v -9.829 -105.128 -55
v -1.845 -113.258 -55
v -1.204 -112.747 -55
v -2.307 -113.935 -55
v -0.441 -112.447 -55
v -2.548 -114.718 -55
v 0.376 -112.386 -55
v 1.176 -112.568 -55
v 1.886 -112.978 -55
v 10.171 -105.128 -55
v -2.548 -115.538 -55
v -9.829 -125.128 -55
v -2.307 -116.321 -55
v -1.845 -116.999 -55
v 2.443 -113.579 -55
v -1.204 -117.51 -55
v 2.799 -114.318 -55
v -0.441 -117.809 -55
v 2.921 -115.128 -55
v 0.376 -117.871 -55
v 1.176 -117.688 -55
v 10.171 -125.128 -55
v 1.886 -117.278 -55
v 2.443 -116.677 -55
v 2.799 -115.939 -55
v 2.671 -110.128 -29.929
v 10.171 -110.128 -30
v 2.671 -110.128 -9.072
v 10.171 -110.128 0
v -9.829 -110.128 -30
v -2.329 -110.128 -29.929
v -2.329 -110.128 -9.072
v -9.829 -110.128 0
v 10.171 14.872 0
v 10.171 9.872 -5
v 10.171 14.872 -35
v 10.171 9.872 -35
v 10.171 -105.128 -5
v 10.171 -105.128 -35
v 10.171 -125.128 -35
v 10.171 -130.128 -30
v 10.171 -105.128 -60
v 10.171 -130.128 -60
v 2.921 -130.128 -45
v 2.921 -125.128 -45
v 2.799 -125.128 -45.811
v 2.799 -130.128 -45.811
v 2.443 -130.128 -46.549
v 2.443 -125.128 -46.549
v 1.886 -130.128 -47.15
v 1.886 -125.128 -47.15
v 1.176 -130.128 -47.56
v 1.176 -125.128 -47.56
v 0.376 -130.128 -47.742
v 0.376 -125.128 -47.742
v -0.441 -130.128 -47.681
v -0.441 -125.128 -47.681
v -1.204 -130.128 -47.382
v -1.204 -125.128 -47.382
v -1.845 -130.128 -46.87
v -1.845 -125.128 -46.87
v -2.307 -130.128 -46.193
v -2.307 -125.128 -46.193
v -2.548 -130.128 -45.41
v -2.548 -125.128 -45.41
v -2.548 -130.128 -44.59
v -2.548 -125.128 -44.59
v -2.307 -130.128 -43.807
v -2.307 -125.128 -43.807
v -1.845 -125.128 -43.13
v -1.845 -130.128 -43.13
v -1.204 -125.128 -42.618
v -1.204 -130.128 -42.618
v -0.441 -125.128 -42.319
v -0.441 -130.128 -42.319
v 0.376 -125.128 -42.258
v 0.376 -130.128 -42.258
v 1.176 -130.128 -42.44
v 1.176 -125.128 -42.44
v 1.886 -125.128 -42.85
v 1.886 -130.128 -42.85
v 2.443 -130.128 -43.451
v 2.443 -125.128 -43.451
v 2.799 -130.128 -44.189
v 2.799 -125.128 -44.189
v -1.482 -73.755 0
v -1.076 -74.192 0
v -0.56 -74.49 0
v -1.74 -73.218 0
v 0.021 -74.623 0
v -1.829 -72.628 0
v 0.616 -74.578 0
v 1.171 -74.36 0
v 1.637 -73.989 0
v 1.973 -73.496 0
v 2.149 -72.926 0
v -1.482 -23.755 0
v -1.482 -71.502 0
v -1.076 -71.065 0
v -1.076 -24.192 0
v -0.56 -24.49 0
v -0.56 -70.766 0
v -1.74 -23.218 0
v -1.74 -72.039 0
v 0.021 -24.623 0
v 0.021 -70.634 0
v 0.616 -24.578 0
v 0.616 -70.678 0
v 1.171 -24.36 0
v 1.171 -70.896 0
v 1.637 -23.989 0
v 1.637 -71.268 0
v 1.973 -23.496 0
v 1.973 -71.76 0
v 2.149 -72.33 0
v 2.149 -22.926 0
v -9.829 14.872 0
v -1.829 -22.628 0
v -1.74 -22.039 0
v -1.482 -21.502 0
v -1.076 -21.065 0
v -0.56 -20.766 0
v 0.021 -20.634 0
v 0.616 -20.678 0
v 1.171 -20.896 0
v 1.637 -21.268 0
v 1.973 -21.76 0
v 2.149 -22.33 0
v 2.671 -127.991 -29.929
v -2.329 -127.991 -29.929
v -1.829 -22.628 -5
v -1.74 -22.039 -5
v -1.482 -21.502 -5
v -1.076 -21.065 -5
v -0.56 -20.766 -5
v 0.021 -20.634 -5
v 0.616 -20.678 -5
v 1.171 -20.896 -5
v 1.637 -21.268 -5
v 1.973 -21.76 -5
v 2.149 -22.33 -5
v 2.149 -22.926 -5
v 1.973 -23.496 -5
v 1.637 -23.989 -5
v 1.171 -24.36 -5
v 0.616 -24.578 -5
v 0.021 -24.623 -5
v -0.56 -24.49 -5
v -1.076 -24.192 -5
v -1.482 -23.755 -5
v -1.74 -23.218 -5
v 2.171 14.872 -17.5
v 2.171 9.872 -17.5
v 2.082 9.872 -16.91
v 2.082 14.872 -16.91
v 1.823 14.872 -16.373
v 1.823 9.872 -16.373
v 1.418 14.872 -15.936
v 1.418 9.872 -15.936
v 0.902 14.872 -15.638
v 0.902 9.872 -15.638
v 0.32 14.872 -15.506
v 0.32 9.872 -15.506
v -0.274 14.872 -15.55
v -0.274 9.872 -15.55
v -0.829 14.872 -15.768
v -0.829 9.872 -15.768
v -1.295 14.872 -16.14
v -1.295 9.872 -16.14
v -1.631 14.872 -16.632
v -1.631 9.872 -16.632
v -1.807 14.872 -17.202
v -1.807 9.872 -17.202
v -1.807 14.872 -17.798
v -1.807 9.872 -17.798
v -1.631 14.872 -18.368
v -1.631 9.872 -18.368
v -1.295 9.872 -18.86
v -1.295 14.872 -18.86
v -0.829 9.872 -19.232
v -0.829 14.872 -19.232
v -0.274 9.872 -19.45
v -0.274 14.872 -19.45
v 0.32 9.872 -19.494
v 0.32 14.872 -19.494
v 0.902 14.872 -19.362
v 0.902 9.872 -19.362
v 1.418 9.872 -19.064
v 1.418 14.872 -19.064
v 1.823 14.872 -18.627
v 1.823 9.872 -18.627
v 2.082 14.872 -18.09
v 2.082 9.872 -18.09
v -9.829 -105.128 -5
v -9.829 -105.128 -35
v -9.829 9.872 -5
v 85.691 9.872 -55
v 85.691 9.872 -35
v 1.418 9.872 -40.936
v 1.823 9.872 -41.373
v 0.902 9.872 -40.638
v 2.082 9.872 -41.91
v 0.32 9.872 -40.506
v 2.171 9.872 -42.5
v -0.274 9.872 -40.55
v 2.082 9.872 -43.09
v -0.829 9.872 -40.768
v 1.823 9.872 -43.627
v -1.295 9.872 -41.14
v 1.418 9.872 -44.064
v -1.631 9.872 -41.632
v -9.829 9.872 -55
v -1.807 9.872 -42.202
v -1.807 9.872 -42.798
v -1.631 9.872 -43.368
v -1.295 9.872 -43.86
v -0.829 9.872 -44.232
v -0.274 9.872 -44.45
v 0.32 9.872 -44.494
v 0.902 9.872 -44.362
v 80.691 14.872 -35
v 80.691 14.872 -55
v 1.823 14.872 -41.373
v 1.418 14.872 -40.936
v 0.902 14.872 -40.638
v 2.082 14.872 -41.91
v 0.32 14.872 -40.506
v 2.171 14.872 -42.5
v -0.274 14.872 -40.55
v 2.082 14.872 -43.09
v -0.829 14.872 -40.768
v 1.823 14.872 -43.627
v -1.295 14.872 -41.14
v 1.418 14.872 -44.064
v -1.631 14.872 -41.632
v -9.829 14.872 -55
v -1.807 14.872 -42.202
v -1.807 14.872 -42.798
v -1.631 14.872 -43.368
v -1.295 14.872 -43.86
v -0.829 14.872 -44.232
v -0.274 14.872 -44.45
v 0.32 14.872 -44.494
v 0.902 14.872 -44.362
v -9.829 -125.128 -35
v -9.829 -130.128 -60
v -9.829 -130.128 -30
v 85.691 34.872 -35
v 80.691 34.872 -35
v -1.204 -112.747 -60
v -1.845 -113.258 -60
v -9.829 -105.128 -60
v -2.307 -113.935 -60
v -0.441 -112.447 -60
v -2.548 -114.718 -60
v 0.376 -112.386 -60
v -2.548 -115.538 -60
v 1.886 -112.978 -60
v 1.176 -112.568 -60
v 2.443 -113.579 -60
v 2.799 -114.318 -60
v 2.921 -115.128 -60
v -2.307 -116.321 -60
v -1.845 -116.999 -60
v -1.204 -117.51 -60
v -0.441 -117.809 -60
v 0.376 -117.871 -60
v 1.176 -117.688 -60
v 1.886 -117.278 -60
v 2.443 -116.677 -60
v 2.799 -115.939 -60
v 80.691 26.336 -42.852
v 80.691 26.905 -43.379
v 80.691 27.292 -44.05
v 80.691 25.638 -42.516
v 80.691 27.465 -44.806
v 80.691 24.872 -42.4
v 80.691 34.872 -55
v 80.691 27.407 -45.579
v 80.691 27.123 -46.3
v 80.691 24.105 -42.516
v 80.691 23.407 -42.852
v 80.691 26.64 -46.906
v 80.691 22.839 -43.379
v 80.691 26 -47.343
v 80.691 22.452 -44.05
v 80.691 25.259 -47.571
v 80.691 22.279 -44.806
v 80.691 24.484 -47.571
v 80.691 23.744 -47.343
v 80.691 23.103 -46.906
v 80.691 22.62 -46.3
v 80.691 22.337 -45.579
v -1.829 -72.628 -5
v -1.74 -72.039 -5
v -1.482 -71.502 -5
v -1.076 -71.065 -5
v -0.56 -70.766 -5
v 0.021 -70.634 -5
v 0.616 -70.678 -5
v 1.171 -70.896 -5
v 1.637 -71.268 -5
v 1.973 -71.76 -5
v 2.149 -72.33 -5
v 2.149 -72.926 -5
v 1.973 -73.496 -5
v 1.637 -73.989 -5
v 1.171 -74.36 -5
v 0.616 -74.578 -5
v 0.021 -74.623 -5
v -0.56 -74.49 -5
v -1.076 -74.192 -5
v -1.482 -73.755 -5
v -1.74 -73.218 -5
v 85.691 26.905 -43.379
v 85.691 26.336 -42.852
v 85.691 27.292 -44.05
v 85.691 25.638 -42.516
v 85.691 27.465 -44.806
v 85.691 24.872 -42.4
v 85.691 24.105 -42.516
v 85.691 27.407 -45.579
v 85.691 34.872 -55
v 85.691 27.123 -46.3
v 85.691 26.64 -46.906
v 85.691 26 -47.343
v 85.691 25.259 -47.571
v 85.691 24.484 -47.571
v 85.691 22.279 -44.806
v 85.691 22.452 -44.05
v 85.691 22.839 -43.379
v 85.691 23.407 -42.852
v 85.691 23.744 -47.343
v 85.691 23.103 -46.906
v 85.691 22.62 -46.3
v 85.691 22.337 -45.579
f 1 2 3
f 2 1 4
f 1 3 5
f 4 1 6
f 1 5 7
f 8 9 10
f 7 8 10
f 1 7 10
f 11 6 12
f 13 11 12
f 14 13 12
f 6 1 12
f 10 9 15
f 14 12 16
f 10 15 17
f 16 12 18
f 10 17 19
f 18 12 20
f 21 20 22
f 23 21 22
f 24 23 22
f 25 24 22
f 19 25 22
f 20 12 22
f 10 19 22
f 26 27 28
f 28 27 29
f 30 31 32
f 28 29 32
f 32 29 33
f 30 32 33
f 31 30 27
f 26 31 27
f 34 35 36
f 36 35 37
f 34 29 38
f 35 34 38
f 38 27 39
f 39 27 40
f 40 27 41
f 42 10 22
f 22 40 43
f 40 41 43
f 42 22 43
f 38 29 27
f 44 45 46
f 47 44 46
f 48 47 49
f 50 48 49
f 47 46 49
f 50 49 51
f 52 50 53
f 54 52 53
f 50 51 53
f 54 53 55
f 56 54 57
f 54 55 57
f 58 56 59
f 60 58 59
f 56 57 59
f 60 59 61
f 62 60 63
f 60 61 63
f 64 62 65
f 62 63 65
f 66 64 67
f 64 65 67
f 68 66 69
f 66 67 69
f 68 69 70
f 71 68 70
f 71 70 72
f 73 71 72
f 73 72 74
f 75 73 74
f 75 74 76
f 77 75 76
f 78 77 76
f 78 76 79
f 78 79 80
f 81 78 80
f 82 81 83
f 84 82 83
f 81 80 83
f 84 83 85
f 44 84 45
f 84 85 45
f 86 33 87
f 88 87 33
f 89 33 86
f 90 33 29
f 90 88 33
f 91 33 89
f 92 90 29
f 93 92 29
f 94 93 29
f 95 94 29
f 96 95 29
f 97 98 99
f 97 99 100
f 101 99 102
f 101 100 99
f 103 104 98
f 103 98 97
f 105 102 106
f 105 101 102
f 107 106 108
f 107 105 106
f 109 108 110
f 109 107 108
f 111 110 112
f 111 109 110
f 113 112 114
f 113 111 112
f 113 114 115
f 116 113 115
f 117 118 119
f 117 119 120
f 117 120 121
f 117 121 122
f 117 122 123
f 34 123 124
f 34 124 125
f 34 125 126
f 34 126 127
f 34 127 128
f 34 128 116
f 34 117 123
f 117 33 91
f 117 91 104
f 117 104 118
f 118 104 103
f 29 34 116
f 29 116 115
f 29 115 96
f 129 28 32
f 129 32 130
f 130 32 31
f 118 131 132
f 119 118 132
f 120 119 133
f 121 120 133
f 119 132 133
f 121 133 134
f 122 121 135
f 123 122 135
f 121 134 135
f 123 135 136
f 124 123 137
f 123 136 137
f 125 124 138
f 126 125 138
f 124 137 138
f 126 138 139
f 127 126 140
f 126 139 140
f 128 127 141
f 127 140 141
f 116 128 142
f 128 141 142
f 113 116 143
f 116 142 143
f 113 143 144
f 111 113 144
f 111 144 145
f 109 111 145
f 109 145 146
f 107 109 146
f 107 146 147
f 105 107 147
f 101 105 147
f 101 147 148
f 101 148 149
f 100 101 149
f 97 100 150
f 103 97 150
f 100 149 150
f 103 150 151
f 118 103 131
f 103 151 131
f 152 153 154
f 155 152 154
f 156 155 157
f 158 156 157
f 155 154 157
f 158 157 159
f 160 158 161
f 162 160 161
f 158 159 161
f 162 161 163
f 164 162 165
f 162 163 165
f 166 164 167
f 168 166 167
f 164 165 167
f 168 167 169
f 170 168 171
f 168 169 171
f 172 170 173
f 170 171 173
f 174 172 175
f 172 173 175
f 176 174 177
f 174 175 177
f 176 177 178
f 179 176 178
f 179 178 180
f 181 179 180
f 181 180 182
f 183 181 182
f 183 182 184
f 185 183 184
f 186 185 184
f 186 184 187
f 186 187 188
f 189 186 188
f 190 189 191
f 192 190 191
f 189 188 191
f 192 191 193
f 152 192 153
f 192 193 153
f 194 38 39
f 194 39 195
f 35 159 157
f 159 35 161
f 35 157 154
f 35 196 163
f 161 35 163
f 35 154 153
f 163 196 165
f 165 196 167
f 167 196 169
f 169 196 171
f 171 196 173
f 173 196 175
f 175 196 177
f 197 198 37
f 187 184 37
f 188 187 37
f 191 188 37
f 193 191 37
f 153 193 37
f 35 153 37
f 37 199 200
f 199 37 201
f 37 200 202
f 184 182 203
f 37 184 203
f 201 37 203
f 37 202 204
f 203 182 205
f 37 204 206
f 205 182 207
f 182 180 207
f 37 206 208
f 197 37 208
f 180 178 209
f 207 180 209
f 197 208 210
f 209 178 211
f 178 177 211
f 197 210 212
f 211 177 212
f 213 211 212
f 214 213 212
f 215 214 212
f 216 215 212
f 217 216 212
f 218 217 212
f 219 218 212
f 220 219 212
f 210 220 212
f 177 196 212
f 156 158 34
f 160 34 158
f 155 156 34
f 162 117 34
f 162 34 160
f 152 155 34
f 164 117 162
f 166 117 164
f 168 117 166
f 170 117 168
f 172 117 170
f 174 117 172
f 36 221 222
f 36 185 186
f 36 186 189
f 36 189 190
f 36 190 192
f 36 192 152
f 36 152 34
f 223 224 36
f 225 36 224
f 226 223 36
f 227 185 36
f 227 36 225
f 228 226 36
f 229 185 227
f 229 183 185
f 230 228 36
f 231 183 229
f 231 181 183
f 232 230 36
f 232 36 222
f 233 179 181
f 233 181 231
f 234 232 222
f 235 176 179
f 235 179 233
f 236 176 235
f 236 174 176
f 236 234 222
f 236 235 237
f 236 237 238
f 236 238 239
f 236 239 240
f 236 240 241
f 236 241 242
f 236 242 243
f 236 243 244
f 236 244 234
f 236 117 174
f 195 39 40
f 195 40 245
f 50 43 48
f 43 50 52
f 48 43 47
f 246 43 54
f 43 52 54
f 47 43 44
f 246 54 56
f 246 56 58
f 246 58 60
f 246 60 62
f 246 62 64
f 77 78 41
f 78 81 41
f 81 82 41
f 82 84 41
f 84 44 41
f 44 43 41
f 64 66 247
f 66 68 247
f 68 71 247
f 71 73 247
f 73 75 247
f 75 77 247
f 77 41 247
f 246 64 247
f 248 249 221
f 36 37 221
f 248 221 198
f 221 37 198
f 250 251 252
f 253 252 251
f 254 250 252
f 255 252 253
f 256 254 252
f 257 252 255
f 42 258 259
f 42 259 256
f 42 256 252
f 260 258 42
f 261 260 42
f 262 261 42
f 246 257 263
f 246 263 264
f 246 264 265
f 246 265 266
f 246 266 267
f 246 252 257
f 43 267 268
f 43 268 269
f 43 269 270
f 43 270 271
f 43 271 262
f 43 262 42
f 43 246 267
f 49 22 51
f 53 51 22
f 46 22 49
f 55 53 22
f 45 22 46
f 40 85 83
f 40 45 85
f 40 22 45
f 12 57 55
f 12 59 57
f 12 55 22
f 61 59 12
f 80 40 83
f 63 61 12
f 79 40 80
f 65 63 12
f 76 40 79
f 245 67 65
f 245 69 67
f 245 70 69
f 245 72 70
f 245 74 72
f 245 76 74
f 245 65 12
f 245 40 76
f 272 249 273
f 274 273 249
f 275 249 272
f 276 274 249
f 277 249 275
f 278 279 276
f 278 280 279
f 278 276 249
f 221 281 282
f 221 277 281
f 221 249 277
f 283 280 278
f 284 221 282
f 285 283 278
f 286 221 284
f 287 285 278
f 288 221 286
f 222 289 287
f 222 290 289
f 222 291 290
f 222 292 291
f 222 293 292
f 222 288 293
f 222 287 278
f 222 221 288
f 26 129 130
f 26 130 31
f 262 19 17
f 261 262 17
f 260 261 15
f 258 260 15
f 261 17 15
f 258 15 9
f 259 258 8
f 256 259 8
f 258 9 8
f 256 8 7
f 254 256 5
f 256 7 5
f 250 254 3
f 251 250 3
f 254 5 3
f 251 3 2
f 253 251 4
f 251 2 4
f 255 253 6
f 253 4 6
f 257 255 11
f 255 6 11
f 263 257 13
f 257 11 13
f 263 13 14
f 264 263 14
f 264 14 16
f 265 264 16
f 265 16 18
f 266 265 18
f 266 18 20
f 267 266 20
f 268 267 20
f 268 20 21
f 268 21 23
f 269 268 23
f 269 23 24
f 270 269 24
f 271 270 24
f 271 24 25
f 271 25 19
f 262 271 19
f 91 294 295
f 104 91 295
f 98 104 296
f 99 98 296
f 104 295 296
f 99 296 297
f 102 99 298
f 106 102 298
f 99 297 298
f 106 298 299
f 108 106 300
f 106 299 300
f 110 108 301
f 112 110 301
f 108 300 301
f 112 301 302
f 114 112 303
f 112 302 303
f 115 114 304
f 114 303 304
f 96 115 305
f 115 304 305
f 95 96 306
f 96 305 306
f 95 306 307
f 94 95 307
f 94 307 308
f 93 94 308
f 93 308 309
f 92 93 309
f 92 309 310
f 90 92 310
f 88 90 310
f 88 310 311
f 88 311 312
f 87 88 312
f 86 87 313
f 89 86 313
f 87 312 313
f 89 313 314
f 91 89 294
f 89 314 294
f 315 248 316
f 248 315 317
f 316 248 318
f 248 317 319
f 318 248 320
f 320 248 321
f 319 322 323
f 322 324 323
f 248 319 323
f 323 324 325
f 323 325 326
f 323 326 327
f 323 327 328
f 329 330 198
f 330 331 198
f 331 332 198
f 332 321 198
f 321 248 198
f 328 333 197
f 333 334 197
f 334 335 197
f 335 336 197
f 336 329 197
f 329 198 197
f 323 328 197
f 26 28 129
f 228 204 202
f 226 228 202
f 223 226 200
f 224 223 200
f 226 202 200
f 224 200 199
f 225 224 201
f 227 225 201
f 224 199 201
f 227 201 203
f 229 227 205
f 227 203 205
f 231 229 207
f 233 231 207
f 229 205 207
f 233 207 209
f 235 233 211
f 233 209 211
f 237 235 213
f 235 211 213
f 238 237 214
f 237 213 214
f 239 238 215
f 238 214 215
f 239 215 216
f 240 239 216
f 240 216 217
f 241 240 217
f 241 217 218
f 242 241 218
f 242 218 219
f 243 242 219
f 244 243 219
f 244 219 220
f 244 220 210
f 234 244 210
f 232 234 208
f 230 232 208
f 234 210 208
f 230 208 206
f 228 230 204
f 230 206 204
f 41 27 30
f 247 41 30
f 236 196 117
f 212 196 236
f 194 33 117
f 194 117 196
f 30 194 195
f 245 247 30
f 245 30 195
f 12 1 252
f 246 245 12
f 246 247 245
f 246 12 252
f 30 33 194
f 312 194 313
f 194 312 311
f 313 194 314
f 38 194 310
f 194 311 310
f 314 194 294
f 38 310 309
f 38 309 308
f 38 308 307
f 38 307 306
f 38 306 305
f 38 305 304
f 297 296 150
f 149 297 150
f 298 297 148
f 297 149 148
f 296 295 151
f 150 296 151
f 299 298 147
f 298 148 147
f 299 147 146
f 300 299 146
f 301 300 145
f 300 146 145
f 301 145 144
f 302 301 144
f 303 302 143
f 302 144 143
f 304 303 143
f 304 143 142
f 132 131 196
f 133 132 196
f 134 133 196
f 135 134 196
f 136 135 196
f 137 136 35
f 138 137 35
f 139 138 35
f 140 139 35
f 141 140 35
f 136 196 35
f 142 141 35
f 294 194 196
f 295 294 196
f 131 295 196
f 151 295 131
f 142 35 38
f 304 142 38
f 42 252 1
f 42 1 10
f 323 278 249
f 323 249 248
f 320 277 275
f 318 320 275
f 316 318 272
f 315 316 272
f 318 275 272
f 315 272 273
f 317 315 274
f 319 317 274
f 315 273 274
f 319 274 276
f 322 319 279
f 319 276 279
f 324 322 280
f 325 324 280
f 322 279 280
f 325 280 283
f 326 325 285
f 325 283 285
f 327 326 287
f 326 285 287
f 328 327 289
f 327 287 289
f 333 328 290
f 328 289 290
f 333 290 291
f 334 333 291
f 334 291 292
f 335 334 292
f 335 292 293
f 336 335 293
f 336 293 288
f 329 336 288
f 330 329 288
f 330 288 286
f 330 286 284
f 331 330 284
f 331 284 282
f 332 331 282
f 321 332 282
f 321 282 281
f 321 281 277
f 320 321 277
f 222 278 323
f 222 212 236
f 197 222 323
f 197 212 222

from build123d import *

# Parameters (mm, degrees)
SKETCH_1_W          = 20
SKETCH_1_H          = 145
EXTRUDE_1_DEPTH     = 5
SKETCH_3_W          = 20
SKETCH_3_H          = 5
EXTRUDE_2_DEPTH     = 50
SKETCH_4_W          = 20
SKETCH_4_H          = 5
EXTRUDE_3_DEPTH     = 30
SKETCH_5_W          = 20
SKETCH_5_H          = 20
CUT_EXTRUDE_1_DEPTH = 30
SKETCH_6_W          = 20
SKETCH_6_H          = 5
EXTRUDE_4_DEPTH     = 20
SKETCH_7_W          = 20
SKETCH_7_H          = 5
EXTRUDE_5_DEPTH     = 20
EXTRUDE_6_DEPTH     = 2.5
SKETCH_10_R         = 2
CUT_EXTRUDE_2_DEPTH = 5
SKETCH_11_R         = 2
CUT_EXTRUDE_3_DEPTH = 5
SKETCH_12_R         = 2.75
CUT_EXTRUDE_4_DEPTH = 5
SKETCH_13_W         = 20
SKETCH_13_H         = 5
EXTRUDE_7_DEPTH     = 5
SKETCH_14_W         = 20
SKETCH_14_H         = 5
EXTRUDE_8_DEPTH     = 20
SKETCH_15_R         = 2.75
CUT_EXTRUDE_5_DEPTH = 20
SKETCH_16_W         = 20
SKETCH_16_H         = 5
EXTRUDE_9_DEPTH     = 75.52
SKETCH_17_W         = 5
SKETCH_17_H         = 20
EXTRUDE_10_DEPTH    = 20
SKETCH_18_R         = 2.6
CUT_EXTRUDE_6_DEPTH = 20


with BuildPart() as part:
    # 草图1 → 凸台-拉伸1 (new body)
    with BuildSketch(Plane.XY):
        with Locations((0.170940171, -57.628205128)):
            Rectangle(SKETCH_1_W, SKETCH_1_H)
    extrude(amount=-EXTRUDE_1_DEPTH)

    # 草图3 → 凸台-拉伸2 (add)
    with BuildSketch(Plane(origin=(0, 0, -5), x_dir=(-1, 0, 0), z_dir=(0, 0, -1))):
        with Locations((-0.170940171, 12.371794872)):
            Rectangle(SKETCH_3_W, SKETCH_3_H)
    extrude(amount=EXTRUDE_2_DEPTH)

    # 草图4 → 凸台-拉伸3 (add)
    with BuildSketch(Plane(origin=(0, 0, -5), x_dir=(-1, 0, 0), z_dir=(0, 0, -1))):
        with Locations((-0.170940171, -107.628205128)):
            Rectangle(SKETCH_4_W, SKETCH_4_H)
    extrude(amount=EXTRUDE_3_DEPTH)

    # 草图5 → 切除-拉伸1 (cut)
    with BuildSketch(Plane(origin=(0, 0, -5), x_dir=(-1, 0, 0), z_dir=(0, 0, -1))):
        with Locations((-0.170940171, -120.128205128)):
            Rectangle(SKETCH_5_W, SKETCH_5_H)
    extrude(amount=-CUT_EXTRUDE_1_DEPTH, mode=Mode.SUBTRACT)

    # 草图6 → 凸台-拉伸4 (add)
    with BuildSketch(Plane(origin=(0, -110.128205128, 0), x_dir=(-1, 0, 0), z_dir=(0, -1, 0))):
        with Locations((-0.170940171, 32.5)):
            Rectangle(SKETCH_6_W, SKETCH_6_H)
    extrude(amount=EXTRUDE_4_DEPTH)

    # 草图7 → 凸台-拉伸5 (add)
    with BuildSketch(Plane(origin=(0, 0, -35), x_dir=(-1, 0, 0), z_dir=(0, 0, -1))):
        with Locations((-0.170940171, -127.628205128)):
            Rectangle(SKETCH_7_W, SKETCH_7_H)
    extrude(amount=EXTRUDE_5_DEPTH)

    # 草图9 → 凸台-拉伸6 (add, symmetric)
    with BuildSketch(Plane(origin=(0.170940171, 0, 0), x_dir=(0, 0, -1), z_dir=(1, 0, 0))):
        Polygon((8.965273833, -110.036991646), (29.929169638, -127.991202337), (29.929169638, -110.036991646), align=None)
    extrude(amount=EXTRUDE_6_DEPTH, both=True)

    # 草图10 → 切除-拉伸2 (cut)
    with BuildSketch(Plane.XZ.offset(-9.871794872)):
        with Locations((0.170940171, -17.5)):
            Circle(SKETCH_10_R)
        with Locations((0.170940171, -42.5)):
            Circle(SKETCH_10_R)
    extrude(amount=-CUT_EXTRUDE_2_DEPTH, mode=Mode.SUBTRACT)

    # 草图11 → 切除-拉伸3 (cut)
    with BuildSketch(Plane(origin=(0, 0, -5), x_dir=(-1, 0, 0), z_dir=(0, 0, -1))):
        with Locations((-0.170940171, -22.628205128)):
            Circle(SKETCH_11_R)
        with Locations((-0.170940171, -72.628205128)):
            Circle(SKETCH_11_R)
    extrude(amount=-CUT_EXTRUDE_3_DEPTH, mode=Mode.SUBTRACT)

    # 草图12 → 切除-拉伸4 (cut)
    with BuildSketch(Plane(origin=(0, -125.128205128, 0), x_dir=(1, 0, 0), z_dir=(0, 1, 0))):
        with Locations((0.170940171, 45)):
            Circle(SKETCH_12_R)
    extrude(amount=-CUT_EXTRUDE_4_DEPTH, mode=Mode.SUBTRACT)

    # 草图13 → 凸台-拉伸7 (add)
    with BuildSketch(Plane(origin=(0, 0, -55), x_dir=(-1, 0, 0), z_dir=(0, 0, -1))):
        with Locations((-0.170940171, -127.628205128)):
            Rectangle(SKETCH_13_W, SKETCH_13_H)
    extrude(amount=EXTRUDE_7_DEPTH)

    # 草图14 → 凸台-拉伸8 (add)
    with BuildSketch(Plane(origin=(0, -125.128205128, 0), x_dir=(1, 0, 0), z_dir=(0, 1, 0))):
        with Locations((0.170940171, 57.5)):
            Rectangle(SKETCH_14_W, SKETCH_14_H)
    extrude(amount=EXTRUDE_8_DEPTH)

    # 草图15 → 切除-拉伸5 (cut)
    with BuildSketch(Plane.XY.offset(-55)):
        with Locations((0.170940171, -115.12820513)):
            Circle(SKETCH_15_R)
    extrude(amount=-CUT_EXTRUDE_5_DEPTH, mode=Mode.SUBTRACT)

    # 草图16 → 凸台-拉伸9 (add)
    with BuildSketch(Plane(origin=(10.170940171, 0, 0), x_dir=(0, 0, -1), z_dir=(1, 0, 0))):
        with Locations((45, 12.371794872)):
            Rectangle(SKETCH_16_W, SKETCH_16_H)
    extrude(amount=EXTRUDE_9_DEPTH)

    # 草图17 → 凸台-拉伸10 (add)
    with BuildSketch(Plane(origin=(0, 14.871794872, 0), x_dir=(1, 0, 0), z_dir=(0, 1, 0))):
        with Locations((83.190940171, 45)):
            Rectangle(SKETCH_17_W, SKETCH_17_H)
    extrude(amount=EXTRUDE_10_DEPTH)

    # 草图18 → 切除-拉伸6 (cut)
    with BuildSketch(Plane.ZY.offset(-80.690940171)):
        with Locations((-45, 24.871794872)):
            Circle(SKETCH_18_R)
    extrude(amount=-CUT_EXTRUDE_6_DEPTH, mode=Mode.SUBTRACT)


solid = part.part
